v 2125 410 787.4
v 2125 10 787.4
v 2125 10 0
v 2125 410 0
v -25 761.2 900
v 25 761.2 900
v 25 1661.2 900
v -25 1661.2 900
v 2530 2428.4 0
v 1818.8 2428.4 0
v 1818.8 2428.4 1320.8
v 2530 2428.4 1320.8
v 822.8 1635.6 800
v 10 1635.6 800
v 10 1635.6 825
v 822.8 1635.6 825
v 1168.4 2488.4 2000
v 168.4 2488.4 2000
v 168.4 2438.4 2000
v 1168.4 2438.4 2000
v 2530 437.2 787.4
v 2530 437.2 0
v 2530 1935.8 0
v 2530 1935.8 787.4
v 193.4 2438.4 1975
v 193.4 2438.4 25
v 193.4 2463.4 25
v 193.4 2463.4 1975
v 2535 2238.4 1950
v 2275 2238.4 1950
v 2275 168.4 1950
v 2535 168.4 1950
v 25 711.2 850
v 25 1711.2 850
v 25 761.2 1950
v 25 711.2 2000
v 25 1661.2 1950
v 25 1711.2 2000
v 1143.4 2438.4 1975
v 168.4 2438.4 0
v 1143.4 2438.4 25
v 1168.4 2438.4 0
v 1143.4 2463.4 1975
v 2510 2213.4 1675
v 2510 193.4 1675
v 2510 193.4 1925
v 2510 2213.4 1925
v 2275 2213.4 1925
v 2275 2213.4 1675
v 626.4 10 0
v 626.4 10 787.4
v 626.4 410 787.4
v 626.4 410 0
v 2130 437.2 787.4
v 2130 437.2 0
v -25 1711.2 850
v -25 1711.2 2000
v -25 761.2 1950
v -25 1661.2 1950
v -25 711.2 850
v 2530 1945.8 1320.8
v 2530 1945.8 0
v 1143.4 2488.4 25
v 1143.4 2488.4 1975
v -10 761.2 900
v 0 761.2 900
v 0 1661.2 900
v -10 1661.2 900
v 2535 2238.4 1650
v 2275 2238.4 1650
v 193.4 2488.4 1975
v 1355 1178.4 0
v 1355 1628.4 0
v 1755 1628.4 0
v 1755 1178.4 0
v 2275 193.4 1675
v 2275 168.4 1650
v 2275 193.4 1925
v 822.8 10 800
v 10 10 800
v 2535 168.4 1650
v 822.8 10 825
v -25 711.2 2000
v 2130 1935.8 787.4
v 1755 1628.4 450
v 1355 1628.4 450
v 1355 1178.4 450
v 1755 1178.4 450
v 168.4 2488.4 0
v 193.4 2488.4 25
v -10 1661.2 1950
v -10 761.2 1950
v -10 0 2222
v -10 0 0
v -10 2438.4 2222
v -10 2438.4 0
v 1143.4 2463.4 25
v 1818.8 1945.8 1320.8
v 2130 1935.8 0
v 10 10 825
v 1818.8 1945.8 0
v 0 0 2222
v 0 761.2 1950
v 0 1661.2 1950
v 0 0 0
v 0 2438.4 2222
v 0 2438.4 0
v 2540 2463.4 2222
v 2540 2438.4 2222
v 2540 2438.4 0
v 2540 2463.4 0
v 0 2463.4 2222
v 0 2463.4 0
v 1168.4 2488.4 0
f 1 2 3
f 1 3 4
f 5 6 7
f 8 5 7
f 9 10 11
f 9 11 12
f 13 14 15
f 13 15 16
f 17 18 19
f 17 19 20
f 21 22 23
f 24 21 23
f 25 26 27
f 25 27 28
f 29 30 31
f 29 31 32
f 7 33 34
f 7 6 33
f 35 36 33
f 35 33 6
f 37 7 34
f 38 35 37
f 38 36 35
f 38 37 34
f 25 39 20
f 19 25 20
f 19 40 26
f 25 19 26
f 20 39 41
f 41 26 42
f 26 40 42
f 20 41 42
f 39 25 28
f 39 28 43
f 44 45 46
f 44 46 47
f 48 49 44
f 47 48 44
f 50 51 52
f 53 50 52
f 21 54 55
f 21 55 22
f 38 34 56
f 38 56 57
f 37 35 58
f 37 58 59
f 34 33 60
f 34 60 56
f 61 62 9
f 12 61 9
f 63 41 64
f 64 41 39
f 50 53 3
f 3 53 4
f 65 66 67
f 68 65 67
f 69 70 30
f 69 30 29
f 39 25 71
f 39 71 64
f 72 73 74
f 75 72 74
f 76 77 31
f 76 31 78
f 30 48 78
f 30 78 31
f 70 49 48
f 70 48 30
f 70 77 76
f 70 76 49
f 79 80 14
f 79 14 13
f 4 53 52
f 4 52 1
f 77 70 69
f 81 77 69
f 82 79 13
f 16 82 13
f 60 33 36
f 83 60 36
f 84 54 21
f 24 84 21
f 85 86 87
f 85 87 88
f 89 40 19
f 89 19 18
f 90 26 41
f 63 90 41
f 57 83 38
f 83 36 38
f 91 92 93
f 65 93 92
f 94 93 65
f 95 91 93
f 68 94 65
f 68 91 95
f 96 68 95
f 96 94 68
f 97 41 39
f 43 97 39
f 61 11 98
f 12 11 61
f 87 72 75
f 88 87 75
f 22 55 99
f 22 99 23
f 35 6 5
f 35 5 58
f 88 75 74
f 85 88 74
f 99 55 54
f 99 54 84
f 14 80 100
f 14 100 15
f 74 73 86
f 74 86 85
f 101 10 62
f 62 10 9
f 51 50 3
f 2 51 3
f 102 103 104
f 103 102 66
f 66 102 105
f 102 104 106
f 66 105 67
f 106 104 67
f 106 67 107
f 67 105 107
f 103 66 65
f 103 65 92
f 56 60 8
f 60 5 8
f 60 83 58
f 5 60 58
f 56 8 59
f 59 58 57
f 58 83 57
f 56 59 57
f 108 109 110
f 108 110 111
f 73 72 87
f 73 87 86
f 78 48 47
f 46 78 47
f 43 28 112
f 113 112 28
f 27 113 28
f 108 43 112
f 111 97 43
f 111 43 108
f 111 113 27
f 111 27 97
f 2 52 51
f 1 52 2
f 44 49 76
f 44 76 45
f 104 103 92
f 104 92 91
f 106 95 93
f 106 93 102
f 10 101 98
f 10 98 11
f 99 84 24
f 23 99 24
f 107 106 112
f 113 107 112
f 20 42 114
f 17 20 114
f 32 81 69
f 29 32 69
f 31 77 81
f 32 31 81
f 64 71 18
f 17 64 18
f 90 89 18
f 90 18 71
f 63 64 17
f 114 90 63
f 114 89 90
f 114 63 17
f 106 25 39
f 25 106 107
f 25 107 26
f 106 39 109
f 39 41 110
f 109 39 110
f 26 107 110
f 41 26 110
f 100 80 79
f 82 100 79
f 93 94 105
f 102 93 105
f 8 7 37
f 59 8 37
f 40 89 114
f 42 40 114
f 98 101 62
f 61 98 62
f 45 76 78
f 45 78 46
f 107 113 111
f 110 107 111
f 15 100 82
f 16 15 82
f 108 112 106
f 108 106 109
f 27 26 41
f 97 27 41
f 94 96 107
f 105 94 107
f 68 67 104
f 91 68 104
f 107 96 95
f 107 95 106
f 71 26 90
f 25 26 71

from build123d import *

# Parameters (mm, degrees)
F3_W      = 400
F3_H      = 1498.6
F4_DEPTH  = 787.4
F2_W      = 711.2
F2_H      = 482.6
F5_DEPTH  = 1320.8
F6_W      = 1498.6
F6_H      = 400
F7_DEPTH  = 787.4
F8_W      = 812.8
F8_H      = 1625.6
F9_DEPTH  = 25
F11_W     = 260
F11_H     = 2070
F12_DEPTH = 300
F13_T     = -25
F14_W     = 10
F14_H     = 2438.4
F15_DEPTH = 2222
F16_W     = 1000
F16_H     = 1150
F17_DEPTH = 25
F18_W     = 900
F18_H     = 1050
F19_DEPTH = 50
F20_W     = 2540
F20_H     = 25
F21_DEPTH = 2222
F22_W     = 1000
F22_H     = 50
F23_DEPTH = 2000
F24_W     = 950
F24_H     = 1950
F25_DEPTH = 50
F26_W     = 400
F26_H     = 450
F27_DEPTH = 450


with BuildPart() as f4:
    # F3 (on Top) → F4 (new body)
    with BuildSketch(Plane.XY):
        with Locations((2330, 1186.5)):
            Rectangle(F3_W, F3_H)
    extrude(amount=F4_DEPTH)


with BuildPart() as f5:
    # F2 (on Top) → F5 (new body)
    with BuildSketch(Plane.XY):
        with Locations((2174.4, 2187.1)):
            Rectangle(F2_W, F2_H)
    extrude(amount=F5_DEPTH)


with BuildPart() as f7:
    # F6 (on face) → F7 (new body)
    with BuildSketch(Plane.XY):
        with Locations((1375.7, 210)):
            Rectangle(F6_W, F6_H)
    extrude(amount=F7_DEPTH)


with BuildPart() as f9:
    # F8 (on offset) → F9 (new body)
    with BuildSketch(Plane.XY.offset(800)):
        with Locations((416.4, 822.8)):
            Rectangle(F8_W, F8_H)
    extrude(amount=F9_DEPTH)


with BuildPart() as f12:
    # F11 (on offset) → F12 (new body)
    with BuildSketch(Plane.XY.offset(1650)):
        with Locations((2405, 1203.4)):
            Rectangle(F11_W, F11_H)
    extrude(amount=F12_DEPTH)

    # F13
    f13_openings = [f12.faces().sort_by_distance(p)[0] for p in [
        (2275, 1203.4, 1800),
    ]]
    offset(amount=F13_T, openings=f13_openings)


with BuildPart() as f15:
    # F14 (on Top) → F15 (new body)
    with BuildSketch(Plane.XY):
        with Locations((-5, 1219.2)):
            Rectangle(F14_W, F14_H)
    extrude(amount=F15_DEPTH)


with BuildPart() as f17:
    # F16 (on Right) → F17 (new body, symmetric)
    with BuildSketch(Plane.YZ):
        with Locations((1211.2, 1425)):
            Rectangle(F16_W, F16_H)
    extrude(amount=F17_DEPTH, both=True)


with BuildPart() as f19_tool:
    # F18 (on face) → F19 (new body, symmetric)
    with BuildSketch(Plane.YZ.offset(25)):
        with Locations((1211.2, 1425)):
            Rectangle(F18_W, F18_H)
    extrude(amount=F19_DEPTH, both=True)


with BuildPart() as f15_1:
    add(f15.part)

    # F19: cut by f19_tool
    add(f19_tool.part, mode=Mode.SUBTRACT)

    # F20 (on Top) → F21 (join)
    with BuildSketch(Plane.XY):
        with Locations((1270, 2450.9)):
            Rectangle(F20_W, F20_H)
    extrude(amount=F21_DEPTH)


with BuildPart() as f17_1:
    add(f17.part)

    # F19: cut by f19_tool
    add(f19_tool.part, mode=Mode.SUBTRACT)


with BuildPart() as f23:
    # F22 (on face) → F23 (new body)
    with BuildSketch(Plane.XY):
        with Locations((668.4, 2463.4)):
            Rectangle(F22_W, F22_H)
    extrude(amount=F23_DEPTH)


with BuildPart() as f25_tool:
    # F24 (on face) → F25 (new body, symmetric)
    with BuildSketch(Plane.XZ.offset(-2438.4)):
        with Locations((668.4, 1000)):
            Rectangle(F24_W, F24_H)
    extrude(amount=F25_DEPTH, both=True)


with BuildPart() as f15_2:
    add(f15_1.part)

    # F25: cut by f25_tool
    add(f25_tool.part, mode=Mode.SUBTRACT)


with BuildPart() as f23_1:
    add(f23.part)

    # F25: cut by f25_tool
    add(f25_tool.part, mode=Mode.SUBTRACT)


with BuildPart() as f27:
    # F26 (on face) → F27 (new body)
    with BuildSketch(Plane.XY):
        with Locations((1555, 1403.4)):
            Rectangle(F26_W, F26_H)
    extrude(amount=F27_DEPTH)


solid = Compound([f4.part, f5.part, f7.part, f9.part, f12.part, f17_1.part, f15_2.part, f23_1.part, f27.part])
